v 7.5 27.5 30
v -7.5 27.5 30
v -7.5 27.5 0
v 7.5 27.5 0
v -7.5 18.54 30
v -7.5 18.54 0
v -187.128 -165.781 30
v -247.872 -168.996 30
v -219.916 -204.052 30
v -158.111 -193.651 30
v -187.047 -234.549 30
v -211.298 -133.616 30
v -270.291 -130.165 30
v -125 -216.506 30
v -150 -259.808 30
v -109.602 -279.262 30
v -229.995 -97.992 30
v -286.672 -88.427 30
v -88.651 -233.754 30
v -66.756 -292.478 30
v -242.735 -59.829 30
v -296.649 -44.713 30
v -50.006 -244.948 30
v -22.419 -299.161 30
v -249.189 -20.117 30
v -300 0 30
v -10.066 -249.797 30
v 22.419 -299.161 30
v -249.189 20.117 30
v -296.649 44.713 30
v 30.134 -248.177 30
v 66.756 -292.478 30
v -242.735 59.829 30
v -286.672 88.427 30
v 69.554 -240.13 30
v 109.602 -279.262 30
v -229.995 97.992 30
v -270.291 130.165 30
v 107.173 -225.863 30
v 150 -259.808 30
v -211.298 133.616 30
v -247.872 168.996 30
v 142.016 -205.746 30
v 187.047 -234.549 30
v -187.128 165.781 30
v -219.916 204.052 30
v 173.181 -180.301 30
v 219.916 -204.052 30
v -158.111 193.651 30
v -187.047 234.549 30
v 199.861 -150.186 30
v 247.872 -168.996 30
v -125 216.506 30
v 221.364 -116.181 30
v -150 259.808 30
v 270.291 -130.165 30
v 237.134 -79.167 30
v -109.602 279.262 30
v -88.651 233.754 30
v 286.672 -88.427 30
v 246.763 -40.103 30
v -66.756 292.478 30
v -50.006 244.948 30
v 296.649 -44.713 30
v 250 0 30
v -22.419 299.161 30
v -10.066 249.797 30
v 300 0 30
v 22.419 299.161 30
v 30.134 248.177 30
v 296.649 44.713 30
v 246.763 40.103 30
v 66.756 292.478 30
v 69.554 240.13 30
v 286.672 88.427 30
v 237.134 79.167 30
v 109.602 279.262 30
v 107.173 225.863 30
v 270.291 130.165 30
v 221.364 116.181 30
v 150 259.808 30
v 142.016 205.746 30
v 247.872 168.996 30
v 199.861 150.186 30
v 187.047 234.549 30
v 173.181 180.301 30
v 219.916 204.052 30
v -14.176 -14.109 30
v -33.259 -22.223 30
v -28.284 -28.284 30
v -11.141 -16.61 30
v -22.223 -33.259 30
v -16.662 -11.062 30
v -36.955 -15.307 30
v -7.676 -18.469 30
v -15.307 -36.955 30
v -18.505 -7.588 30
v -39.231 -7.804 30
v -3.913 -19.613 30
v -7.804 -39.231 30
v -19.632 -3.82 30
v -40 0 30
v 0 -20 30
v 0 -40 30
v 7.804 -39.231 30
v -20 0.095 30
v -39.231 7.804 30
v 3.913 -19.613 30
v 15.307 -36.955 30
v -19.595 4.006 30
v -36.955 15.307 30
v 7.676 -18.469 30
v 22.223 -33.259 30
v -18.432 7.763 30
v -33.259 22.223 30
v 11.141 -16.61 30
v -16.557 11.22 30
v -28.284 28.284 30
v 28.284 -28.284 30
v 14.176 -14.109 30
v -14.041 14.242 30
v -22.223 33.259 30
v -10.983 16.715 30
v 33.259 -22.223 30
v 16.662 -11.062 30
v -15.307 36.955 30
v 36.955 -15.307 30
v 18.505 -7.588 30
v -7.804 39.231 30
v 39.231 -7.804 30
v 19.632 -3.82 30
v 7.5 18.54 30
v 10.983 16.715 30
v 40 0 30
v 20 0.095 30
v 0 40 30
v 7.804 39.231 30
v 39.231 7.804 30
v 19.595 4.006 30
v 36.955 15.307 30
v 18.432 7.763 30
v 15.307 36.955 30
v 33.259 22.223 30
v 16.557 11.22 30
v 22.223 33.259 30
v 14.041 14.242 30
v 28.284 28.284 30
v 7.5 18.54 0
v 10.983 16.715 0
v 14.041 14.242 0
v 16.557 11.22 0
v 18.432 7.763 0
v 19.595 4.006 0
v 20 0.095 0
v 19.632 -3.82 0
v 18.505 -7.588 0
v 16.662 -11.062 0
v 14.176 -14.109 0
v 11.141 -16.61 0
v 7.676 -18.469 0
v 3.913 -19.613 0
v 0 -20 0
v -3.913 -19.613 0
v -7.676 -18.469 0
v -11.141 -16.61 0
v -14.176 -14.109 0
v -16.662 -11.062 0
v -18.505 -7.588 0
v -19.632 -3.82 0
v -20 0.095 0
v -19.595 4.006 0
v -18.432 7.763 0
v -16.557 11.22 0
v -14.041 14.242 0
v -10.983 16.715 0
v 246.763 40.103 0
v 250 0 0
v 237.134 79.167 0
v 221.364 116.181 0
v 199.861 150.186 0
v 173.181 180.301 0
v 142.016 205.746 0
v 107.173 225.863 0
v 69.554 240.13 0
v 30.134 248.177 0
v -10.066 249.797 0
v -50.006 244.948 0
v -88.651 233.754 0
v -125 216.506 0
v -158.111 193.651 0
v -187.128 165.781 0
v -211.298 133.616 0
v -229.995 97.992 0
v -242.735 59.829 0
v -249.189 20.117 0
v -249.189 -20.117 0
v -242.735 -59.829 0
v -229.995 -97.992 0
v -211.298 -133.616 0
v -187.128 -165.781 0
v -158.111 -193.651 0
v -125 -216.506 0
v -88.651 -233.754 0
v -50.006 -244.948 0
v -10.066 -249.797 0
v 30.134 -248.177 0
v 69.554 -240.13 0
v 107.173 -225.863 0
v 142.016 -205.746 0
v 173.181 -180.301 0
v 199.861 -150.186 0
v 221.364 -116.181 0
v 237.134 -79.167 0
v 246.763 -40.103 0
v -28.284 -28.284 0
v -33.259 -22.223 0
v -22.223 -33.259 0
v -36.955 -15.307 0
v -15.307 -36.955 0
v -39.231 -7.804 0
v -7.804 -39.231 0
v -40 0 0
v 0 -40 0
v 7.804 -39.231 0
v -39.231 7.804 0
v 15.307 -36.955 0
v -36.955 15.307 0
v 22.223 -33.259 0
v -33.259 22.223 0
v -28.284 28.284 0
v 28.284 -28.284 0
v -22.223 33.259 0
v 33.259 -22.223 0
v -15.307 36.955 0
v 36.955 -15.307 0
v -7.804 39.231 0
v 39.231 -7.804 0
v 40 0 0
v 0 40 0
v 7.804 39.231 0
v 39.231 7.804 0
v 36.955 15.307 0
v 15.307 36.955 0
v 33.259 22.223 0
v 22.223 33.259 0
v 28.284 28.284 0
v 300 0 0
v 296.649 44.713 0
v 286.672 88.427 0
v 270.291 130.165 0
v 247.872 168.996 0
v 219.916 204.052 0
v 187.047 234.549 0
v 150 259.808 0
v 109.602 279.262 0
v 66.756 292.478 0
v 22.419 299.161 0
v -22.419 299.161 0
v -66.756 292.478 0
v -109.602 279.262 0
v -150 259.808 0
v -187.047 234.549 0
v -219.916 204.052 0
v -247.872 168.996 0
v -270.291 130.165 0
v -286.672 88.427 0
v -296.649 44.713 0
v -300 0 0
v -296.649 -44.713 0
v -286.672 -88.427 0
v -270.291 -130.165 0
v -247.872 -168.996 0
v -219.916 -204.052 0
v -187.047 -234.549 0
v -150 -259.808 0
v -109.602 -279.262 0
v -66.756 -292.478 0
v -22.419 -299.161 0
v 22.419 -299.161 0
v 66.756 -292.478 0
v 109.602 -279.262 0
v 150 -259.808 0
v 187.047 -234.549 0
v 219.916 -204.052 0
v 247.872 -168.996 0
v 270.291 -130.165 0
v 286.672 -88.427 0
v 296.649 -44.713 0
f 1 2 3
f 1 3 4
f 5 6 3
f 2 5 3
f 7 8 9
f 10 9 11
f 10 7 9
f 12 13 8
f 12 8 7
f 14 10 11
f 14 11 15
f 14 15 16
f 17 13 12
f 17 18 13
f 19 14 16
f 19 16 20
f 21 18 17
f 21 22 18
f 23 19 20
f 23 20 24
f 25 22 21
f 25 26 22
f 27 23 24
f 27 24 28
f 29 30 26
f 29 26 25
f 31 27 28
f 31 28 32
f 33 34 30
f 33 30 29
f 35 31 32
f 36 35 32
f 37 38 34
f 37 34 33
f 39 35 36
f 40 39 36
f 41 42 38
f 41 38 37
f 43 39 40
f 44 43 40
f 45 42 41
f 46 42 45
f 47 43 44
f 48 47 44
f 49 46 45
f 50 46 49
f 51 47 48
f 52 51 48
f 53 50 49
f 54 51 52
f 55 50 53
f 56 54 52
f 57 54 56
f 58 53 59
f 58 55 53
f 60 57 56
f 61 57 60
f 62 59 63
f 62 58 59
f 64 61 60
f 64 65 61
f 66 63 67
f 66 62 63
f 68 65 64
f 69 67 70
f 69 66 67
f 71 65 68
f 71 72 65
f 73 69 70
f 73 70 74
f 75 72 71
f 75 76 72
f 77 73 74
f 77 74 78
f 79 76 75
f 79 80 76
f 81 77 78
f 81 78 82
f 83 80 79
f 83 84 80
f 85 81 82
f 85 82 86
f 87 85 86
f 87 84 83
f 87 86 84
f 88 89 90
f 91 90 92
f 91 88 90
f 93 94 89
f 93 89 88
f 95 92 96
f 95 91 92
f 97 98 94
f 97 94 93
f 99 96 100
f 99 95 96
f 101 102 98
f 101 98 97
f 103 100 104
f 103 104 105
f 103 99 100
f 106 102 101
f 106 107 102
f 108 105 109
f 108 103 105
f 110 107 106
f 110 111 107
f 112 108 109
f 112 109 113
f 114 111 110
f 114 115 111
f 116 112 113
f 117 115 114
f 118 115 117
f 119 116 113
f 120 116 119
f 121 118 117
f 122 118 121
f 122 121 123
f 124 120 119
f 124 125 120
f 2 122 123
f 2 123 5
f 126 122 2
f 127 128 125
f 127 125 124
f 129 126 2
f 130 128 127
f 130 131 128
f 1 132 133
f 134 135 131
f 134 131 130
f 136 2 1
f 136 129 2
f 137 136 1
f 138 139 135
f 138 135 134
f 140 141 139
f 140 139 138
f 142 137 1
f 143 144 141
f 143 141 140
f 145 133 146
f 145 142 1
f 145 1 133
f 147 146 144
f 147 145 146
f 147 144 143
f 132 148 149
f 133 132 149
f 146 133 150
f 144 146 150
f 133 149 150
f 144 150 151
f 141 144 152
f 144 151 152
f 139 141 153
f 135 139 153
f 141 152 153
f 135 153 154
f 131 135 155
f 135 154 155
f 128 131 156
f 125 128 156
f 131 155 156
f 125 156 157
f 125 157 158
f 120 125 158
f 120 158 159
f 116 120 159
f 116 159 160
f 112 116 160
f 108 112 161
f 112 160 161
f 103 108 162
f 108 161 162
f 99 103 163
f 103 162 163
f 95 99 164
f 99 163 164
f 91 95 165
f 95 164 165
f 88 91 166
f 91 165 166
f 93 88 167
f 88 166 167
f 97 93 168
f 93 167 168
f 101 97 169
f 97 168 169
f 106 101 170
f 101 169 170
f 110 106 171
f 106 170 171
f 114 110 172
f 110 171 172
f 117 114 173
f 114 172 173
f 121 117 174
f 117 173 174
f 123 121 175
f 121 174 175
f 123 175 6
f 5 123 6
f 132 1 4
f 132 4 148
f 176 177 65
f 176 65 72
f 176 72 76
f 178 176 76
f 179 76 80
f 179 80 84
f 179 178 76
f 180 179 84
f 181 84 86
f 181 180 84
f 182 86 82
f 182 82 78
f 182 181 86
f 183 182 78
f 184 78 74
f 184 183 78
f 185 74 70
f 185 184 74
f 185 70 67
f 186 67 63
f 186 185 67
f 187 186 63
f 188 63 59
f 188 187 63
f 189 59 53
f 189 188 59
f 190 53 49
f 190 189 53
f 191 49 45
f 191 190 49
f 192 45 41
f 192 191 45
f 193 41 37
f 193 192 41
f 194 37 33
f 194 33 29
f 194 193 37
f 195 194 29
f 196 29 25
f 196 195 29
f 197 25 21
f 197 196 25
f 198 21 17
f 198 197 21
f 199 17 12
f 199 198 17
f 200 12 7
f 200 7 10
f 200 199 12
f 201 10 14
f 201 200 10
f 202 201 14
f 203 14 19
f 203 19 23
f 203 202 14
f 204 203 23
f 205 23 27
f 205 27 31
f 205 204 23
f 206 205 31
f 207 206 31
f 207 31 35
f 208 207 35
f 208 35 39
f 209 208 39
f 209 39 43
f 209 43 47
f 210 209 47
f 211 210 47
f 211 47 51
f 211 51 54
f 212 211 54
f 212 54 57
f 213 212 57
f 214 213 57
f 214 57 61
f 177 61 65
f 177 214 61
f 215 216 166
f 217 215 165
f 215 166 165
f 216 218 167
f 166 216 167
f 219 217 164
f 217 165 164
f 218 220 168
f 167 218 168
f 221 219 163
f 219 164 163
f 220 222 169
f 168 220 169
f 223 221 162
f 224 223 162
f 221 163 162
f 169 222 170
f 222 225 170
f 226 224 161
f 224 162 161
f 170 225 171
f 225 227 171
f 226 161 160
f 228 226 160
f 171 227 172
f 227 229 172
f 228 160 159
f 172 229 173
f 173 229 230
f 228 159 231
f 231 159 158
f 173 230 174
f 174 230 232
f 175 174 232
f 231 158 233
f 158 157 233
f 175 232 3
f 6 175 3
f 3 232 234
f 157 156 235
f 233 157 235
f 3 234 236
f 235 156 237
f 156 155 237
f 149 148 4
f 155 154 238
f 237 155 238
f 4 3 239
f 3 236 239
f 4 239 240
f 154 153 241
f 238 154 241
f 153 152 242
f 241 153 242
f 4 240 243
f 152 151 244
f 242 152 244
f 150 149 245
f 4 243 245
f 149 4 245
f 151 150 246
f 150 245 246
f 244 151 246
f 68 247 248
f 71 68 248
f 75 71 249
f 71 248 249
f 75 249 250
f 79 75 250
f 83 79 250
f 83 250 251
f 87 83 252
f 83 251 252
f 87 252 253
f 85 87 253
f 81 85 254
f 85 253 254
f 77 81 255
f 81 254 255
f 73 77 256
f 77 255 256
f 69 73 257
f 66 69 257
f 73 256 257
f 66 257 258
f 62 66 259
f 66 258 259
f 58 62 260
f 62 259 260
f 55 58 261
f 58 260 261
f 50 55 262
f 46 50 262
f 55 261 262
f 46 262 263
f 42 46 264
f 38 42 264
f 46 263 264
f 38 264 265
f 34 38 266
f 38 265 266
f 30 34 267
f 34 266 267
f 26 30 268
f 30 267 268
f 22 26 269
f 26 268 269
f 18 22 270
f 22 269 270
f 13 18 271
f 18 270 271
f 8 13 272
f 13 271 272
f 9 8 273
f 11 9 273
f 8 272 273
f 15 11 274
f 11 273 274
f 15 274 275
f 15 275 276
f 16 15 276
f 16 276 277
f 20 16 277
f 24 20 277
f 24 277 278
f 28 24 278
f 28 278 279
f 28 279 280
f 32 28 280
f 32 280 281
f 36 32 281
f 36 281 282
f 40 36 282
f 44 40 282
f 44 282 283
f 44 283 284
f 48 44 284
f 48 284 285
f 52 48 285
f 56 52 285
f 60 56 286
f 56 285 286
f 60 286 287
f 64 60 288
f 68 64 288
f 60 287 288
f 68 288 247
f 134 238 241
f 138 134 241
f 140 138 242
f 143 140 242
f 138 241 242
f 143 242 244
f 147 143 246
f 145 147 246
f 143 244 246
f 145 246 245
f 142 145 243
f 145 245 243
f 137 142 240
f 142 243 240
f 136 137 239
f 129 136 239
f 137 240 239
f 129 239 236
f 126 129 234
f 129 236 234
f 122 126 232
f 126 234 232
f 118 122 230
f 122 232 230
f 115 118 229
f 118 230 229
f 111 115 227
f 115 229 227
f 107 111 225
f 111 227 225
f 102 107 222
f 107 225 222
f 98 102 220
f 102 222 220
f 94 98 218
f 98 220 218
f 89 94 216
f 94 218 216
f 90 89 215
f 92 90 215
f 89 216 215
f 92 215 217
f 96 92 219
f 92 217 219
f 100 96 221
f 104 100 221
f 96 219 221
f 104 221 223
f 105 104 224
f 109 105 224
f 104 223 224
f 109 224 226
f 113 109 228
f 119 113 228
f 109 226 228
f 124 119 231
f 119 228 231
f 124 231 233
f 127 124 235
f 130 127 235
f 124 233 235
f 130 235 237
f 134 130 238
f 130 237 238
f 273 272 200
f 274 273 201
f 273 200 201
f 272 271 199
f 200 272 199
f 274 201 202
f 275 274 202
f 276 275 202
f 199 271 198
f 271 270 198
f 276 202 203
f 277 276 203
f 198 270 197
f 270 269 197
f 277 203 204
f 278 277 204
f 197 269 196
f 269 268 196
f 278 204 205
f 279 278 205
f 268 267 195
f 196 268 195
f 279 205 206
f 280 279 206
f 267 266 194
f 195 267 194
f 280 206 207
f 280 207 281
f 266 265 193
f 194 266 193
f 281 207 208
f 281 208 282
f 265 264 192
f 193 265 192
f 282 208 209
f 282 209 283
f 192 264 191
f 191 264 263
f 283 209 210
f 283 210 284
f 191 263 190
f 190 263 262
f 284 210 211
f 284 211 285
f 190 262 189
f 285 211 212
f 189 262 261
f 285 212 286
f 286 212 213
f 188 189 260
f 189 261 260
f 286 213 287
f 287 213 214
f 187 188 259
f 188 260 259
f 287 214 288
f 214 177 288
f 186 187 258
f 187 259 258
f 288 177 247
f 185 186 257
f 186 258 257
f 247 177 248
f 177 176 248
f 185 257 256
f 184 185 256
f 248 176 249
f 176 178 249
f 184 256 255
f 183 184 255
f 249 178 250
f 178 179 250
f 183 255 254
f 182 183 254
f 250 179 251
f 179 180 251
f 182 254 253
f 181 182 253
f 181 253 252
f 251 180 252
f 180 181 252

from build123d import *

# Parameters (mm, degrees)
F0_R     = 40
F1_DEPTH = 30
F0_R_2   = 300
F0_R_3   = 250


with BuildPart() as f1:
    # F0 (on Top) → F1 (new body)
    with BuildSketch(Plane.XY):
        Circle(F0_R)
        with BuildLine():
            ThreePointArc((7.5, 18.5404962177), (0, -20), (-7.5, 18.5404962177))
            Line((-7.5, 18.5404962177), (-7.5, 27.5))
            Line((-7.5, 27.5), (7.5, 27.5))
            Line((7.5, 27.5), (7.5, 18.5404962177))
        make_face(mode=Mode.SUBTRACT)
    extrude(amount=F1_DEPTH)


with BuildPart() as f1b:
    # F0 (on Top) → F1, piece 2 (new body)
    with BuildSketch(Plane.XY):
        Circle(F0_R_2)
        Circle(F0_R_3, mode=Mode.SUBTRACT)
    extrude(amount=F1_DEPTH)


solid = Compound([f1.part, f1b.part])
